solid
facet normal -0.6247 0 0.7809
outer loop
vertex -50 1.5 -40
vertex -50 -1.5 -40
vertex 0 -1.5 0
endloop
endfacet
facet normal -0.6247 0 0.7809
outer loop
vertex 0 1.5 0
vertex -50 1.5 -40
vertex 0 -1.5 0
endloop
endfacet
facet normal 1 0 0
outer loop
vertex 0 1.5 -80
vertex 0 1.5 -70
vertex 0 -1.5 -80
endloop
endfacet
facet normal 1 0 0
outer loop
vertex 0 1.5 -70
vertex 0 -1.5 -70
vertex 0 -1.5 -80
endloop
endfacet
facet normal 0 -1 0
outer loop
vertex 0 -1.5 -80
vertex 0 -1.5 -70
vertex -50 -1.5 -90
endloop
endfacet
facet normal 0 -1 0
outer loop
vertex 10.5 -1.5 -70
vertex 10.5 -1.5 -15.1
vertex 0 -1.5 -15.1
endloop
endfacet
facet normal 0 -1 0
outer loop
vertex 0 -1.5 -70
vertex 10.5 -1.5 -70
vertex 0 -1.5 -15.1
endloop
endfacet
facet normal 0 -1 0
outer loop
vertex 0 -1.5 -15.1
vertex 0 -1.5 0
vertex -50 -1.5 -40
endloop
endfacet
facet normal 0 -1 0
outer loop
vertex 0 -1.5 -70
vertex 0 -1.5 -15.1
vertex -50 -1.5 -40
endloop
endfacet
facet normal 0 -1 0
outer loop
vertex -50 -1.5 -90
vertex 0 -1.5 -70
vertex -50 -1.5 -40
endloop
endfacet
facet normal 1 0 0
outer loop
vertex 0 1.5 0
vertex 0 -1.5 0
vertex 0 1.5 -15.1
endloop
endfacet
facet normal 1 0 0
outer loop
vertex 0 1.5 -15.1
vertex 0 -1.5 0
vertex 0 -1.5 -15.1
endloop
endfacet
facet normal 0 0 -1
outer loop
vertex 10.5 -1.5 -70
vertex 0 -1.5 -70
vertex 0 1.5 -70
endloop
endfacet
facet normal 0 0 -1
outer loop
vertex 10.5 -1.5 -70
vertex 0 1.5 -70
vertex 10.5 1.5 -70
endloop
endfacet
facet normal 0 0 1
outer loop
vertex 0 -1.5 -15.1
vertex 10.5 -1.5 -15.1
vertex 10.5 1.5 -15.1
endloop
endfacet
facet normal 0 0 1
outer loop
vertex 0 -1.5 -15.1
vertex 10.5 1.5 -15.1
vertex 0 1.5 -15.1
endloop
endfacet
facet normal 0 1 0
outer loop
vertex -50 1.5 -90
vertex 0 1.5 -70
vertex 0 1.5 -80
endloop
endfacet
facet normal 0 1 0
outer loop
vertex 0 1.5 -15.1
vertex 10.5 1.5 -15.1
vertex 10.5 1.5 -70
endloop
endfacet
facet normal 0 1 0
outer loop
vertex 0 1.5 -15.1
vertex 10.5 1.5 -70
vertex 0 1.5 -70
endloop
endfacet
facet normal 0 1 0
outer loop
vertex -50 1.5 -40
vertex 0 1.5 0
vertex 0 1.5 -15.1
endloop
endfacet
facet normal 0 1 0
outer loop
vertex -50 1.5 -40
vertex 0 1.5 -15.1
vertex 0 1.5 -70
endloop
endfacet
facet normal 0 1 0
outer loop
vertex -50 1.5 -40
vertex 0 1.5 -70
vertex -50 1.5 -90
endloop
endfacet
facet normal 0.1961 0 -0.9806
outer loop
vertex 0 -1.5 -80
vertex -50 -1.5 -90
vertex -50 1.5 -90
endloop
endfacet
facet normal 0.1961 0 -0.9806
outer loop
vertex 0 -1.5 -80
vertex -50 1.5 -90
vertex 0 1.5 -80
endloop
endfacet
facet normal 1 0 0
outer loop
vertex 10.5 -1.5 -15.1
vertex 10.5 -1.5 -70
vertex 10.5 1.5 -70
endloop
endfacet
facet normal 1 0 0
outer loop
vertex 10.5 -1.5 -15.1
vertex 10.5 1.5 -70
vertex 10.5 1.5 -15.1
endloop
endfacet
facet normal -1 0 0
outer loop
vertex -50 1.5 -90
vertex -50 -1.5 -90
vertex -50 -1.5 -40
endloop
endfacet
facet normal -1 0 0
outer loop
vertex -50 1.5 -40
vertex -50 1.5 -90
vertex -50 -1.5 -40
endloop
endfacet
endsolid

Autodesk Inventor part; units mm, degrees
ref_plane "YZ Plane" through (0, 0, 0) normal (1, 0, 0) x (0, 1, 0)
ref_plane "XZ Plane" through (0, 0, 0) normal (0, 1, 0) x (-1, 0, 0)
ref_plane "XY Plane" through (0, 0, 0) normal (0, 0, 1) x (1, 0, 0)
sketch "Sketch1" plane through (0, 0, 0) normal (0, 1, 0) x (-1, 0, 0)
  line L0 (0, 0) -> (0, -80)
  line L1 (50, -90) -> (0, -80)
  line L2 (0, -70) -> (-10.5, -70)
  line L3 (-10.5, -70) -> (-10.5, -15.1)
  line L4 (-10.5, -15.1) -> (0, -15.1)
  line L5 (0, -15.1) -> (-4, -15.1)
  line L6 (-4, -15.1) -> (-4, -70) construction
  line L7 (50, -90) -> (50, -40)
  line L8 (50, -40) -> (0, 0)
  dimension "d0" = 80
  dimension "d1" = 50
  dimension "d5" = 10
  dimension "d6" = 54.9
  dimension "d9" = 4
extrude "Extrusion1" add sketch "Sketch1" along normal mid plane 3
properties part number "Stateczniki"
